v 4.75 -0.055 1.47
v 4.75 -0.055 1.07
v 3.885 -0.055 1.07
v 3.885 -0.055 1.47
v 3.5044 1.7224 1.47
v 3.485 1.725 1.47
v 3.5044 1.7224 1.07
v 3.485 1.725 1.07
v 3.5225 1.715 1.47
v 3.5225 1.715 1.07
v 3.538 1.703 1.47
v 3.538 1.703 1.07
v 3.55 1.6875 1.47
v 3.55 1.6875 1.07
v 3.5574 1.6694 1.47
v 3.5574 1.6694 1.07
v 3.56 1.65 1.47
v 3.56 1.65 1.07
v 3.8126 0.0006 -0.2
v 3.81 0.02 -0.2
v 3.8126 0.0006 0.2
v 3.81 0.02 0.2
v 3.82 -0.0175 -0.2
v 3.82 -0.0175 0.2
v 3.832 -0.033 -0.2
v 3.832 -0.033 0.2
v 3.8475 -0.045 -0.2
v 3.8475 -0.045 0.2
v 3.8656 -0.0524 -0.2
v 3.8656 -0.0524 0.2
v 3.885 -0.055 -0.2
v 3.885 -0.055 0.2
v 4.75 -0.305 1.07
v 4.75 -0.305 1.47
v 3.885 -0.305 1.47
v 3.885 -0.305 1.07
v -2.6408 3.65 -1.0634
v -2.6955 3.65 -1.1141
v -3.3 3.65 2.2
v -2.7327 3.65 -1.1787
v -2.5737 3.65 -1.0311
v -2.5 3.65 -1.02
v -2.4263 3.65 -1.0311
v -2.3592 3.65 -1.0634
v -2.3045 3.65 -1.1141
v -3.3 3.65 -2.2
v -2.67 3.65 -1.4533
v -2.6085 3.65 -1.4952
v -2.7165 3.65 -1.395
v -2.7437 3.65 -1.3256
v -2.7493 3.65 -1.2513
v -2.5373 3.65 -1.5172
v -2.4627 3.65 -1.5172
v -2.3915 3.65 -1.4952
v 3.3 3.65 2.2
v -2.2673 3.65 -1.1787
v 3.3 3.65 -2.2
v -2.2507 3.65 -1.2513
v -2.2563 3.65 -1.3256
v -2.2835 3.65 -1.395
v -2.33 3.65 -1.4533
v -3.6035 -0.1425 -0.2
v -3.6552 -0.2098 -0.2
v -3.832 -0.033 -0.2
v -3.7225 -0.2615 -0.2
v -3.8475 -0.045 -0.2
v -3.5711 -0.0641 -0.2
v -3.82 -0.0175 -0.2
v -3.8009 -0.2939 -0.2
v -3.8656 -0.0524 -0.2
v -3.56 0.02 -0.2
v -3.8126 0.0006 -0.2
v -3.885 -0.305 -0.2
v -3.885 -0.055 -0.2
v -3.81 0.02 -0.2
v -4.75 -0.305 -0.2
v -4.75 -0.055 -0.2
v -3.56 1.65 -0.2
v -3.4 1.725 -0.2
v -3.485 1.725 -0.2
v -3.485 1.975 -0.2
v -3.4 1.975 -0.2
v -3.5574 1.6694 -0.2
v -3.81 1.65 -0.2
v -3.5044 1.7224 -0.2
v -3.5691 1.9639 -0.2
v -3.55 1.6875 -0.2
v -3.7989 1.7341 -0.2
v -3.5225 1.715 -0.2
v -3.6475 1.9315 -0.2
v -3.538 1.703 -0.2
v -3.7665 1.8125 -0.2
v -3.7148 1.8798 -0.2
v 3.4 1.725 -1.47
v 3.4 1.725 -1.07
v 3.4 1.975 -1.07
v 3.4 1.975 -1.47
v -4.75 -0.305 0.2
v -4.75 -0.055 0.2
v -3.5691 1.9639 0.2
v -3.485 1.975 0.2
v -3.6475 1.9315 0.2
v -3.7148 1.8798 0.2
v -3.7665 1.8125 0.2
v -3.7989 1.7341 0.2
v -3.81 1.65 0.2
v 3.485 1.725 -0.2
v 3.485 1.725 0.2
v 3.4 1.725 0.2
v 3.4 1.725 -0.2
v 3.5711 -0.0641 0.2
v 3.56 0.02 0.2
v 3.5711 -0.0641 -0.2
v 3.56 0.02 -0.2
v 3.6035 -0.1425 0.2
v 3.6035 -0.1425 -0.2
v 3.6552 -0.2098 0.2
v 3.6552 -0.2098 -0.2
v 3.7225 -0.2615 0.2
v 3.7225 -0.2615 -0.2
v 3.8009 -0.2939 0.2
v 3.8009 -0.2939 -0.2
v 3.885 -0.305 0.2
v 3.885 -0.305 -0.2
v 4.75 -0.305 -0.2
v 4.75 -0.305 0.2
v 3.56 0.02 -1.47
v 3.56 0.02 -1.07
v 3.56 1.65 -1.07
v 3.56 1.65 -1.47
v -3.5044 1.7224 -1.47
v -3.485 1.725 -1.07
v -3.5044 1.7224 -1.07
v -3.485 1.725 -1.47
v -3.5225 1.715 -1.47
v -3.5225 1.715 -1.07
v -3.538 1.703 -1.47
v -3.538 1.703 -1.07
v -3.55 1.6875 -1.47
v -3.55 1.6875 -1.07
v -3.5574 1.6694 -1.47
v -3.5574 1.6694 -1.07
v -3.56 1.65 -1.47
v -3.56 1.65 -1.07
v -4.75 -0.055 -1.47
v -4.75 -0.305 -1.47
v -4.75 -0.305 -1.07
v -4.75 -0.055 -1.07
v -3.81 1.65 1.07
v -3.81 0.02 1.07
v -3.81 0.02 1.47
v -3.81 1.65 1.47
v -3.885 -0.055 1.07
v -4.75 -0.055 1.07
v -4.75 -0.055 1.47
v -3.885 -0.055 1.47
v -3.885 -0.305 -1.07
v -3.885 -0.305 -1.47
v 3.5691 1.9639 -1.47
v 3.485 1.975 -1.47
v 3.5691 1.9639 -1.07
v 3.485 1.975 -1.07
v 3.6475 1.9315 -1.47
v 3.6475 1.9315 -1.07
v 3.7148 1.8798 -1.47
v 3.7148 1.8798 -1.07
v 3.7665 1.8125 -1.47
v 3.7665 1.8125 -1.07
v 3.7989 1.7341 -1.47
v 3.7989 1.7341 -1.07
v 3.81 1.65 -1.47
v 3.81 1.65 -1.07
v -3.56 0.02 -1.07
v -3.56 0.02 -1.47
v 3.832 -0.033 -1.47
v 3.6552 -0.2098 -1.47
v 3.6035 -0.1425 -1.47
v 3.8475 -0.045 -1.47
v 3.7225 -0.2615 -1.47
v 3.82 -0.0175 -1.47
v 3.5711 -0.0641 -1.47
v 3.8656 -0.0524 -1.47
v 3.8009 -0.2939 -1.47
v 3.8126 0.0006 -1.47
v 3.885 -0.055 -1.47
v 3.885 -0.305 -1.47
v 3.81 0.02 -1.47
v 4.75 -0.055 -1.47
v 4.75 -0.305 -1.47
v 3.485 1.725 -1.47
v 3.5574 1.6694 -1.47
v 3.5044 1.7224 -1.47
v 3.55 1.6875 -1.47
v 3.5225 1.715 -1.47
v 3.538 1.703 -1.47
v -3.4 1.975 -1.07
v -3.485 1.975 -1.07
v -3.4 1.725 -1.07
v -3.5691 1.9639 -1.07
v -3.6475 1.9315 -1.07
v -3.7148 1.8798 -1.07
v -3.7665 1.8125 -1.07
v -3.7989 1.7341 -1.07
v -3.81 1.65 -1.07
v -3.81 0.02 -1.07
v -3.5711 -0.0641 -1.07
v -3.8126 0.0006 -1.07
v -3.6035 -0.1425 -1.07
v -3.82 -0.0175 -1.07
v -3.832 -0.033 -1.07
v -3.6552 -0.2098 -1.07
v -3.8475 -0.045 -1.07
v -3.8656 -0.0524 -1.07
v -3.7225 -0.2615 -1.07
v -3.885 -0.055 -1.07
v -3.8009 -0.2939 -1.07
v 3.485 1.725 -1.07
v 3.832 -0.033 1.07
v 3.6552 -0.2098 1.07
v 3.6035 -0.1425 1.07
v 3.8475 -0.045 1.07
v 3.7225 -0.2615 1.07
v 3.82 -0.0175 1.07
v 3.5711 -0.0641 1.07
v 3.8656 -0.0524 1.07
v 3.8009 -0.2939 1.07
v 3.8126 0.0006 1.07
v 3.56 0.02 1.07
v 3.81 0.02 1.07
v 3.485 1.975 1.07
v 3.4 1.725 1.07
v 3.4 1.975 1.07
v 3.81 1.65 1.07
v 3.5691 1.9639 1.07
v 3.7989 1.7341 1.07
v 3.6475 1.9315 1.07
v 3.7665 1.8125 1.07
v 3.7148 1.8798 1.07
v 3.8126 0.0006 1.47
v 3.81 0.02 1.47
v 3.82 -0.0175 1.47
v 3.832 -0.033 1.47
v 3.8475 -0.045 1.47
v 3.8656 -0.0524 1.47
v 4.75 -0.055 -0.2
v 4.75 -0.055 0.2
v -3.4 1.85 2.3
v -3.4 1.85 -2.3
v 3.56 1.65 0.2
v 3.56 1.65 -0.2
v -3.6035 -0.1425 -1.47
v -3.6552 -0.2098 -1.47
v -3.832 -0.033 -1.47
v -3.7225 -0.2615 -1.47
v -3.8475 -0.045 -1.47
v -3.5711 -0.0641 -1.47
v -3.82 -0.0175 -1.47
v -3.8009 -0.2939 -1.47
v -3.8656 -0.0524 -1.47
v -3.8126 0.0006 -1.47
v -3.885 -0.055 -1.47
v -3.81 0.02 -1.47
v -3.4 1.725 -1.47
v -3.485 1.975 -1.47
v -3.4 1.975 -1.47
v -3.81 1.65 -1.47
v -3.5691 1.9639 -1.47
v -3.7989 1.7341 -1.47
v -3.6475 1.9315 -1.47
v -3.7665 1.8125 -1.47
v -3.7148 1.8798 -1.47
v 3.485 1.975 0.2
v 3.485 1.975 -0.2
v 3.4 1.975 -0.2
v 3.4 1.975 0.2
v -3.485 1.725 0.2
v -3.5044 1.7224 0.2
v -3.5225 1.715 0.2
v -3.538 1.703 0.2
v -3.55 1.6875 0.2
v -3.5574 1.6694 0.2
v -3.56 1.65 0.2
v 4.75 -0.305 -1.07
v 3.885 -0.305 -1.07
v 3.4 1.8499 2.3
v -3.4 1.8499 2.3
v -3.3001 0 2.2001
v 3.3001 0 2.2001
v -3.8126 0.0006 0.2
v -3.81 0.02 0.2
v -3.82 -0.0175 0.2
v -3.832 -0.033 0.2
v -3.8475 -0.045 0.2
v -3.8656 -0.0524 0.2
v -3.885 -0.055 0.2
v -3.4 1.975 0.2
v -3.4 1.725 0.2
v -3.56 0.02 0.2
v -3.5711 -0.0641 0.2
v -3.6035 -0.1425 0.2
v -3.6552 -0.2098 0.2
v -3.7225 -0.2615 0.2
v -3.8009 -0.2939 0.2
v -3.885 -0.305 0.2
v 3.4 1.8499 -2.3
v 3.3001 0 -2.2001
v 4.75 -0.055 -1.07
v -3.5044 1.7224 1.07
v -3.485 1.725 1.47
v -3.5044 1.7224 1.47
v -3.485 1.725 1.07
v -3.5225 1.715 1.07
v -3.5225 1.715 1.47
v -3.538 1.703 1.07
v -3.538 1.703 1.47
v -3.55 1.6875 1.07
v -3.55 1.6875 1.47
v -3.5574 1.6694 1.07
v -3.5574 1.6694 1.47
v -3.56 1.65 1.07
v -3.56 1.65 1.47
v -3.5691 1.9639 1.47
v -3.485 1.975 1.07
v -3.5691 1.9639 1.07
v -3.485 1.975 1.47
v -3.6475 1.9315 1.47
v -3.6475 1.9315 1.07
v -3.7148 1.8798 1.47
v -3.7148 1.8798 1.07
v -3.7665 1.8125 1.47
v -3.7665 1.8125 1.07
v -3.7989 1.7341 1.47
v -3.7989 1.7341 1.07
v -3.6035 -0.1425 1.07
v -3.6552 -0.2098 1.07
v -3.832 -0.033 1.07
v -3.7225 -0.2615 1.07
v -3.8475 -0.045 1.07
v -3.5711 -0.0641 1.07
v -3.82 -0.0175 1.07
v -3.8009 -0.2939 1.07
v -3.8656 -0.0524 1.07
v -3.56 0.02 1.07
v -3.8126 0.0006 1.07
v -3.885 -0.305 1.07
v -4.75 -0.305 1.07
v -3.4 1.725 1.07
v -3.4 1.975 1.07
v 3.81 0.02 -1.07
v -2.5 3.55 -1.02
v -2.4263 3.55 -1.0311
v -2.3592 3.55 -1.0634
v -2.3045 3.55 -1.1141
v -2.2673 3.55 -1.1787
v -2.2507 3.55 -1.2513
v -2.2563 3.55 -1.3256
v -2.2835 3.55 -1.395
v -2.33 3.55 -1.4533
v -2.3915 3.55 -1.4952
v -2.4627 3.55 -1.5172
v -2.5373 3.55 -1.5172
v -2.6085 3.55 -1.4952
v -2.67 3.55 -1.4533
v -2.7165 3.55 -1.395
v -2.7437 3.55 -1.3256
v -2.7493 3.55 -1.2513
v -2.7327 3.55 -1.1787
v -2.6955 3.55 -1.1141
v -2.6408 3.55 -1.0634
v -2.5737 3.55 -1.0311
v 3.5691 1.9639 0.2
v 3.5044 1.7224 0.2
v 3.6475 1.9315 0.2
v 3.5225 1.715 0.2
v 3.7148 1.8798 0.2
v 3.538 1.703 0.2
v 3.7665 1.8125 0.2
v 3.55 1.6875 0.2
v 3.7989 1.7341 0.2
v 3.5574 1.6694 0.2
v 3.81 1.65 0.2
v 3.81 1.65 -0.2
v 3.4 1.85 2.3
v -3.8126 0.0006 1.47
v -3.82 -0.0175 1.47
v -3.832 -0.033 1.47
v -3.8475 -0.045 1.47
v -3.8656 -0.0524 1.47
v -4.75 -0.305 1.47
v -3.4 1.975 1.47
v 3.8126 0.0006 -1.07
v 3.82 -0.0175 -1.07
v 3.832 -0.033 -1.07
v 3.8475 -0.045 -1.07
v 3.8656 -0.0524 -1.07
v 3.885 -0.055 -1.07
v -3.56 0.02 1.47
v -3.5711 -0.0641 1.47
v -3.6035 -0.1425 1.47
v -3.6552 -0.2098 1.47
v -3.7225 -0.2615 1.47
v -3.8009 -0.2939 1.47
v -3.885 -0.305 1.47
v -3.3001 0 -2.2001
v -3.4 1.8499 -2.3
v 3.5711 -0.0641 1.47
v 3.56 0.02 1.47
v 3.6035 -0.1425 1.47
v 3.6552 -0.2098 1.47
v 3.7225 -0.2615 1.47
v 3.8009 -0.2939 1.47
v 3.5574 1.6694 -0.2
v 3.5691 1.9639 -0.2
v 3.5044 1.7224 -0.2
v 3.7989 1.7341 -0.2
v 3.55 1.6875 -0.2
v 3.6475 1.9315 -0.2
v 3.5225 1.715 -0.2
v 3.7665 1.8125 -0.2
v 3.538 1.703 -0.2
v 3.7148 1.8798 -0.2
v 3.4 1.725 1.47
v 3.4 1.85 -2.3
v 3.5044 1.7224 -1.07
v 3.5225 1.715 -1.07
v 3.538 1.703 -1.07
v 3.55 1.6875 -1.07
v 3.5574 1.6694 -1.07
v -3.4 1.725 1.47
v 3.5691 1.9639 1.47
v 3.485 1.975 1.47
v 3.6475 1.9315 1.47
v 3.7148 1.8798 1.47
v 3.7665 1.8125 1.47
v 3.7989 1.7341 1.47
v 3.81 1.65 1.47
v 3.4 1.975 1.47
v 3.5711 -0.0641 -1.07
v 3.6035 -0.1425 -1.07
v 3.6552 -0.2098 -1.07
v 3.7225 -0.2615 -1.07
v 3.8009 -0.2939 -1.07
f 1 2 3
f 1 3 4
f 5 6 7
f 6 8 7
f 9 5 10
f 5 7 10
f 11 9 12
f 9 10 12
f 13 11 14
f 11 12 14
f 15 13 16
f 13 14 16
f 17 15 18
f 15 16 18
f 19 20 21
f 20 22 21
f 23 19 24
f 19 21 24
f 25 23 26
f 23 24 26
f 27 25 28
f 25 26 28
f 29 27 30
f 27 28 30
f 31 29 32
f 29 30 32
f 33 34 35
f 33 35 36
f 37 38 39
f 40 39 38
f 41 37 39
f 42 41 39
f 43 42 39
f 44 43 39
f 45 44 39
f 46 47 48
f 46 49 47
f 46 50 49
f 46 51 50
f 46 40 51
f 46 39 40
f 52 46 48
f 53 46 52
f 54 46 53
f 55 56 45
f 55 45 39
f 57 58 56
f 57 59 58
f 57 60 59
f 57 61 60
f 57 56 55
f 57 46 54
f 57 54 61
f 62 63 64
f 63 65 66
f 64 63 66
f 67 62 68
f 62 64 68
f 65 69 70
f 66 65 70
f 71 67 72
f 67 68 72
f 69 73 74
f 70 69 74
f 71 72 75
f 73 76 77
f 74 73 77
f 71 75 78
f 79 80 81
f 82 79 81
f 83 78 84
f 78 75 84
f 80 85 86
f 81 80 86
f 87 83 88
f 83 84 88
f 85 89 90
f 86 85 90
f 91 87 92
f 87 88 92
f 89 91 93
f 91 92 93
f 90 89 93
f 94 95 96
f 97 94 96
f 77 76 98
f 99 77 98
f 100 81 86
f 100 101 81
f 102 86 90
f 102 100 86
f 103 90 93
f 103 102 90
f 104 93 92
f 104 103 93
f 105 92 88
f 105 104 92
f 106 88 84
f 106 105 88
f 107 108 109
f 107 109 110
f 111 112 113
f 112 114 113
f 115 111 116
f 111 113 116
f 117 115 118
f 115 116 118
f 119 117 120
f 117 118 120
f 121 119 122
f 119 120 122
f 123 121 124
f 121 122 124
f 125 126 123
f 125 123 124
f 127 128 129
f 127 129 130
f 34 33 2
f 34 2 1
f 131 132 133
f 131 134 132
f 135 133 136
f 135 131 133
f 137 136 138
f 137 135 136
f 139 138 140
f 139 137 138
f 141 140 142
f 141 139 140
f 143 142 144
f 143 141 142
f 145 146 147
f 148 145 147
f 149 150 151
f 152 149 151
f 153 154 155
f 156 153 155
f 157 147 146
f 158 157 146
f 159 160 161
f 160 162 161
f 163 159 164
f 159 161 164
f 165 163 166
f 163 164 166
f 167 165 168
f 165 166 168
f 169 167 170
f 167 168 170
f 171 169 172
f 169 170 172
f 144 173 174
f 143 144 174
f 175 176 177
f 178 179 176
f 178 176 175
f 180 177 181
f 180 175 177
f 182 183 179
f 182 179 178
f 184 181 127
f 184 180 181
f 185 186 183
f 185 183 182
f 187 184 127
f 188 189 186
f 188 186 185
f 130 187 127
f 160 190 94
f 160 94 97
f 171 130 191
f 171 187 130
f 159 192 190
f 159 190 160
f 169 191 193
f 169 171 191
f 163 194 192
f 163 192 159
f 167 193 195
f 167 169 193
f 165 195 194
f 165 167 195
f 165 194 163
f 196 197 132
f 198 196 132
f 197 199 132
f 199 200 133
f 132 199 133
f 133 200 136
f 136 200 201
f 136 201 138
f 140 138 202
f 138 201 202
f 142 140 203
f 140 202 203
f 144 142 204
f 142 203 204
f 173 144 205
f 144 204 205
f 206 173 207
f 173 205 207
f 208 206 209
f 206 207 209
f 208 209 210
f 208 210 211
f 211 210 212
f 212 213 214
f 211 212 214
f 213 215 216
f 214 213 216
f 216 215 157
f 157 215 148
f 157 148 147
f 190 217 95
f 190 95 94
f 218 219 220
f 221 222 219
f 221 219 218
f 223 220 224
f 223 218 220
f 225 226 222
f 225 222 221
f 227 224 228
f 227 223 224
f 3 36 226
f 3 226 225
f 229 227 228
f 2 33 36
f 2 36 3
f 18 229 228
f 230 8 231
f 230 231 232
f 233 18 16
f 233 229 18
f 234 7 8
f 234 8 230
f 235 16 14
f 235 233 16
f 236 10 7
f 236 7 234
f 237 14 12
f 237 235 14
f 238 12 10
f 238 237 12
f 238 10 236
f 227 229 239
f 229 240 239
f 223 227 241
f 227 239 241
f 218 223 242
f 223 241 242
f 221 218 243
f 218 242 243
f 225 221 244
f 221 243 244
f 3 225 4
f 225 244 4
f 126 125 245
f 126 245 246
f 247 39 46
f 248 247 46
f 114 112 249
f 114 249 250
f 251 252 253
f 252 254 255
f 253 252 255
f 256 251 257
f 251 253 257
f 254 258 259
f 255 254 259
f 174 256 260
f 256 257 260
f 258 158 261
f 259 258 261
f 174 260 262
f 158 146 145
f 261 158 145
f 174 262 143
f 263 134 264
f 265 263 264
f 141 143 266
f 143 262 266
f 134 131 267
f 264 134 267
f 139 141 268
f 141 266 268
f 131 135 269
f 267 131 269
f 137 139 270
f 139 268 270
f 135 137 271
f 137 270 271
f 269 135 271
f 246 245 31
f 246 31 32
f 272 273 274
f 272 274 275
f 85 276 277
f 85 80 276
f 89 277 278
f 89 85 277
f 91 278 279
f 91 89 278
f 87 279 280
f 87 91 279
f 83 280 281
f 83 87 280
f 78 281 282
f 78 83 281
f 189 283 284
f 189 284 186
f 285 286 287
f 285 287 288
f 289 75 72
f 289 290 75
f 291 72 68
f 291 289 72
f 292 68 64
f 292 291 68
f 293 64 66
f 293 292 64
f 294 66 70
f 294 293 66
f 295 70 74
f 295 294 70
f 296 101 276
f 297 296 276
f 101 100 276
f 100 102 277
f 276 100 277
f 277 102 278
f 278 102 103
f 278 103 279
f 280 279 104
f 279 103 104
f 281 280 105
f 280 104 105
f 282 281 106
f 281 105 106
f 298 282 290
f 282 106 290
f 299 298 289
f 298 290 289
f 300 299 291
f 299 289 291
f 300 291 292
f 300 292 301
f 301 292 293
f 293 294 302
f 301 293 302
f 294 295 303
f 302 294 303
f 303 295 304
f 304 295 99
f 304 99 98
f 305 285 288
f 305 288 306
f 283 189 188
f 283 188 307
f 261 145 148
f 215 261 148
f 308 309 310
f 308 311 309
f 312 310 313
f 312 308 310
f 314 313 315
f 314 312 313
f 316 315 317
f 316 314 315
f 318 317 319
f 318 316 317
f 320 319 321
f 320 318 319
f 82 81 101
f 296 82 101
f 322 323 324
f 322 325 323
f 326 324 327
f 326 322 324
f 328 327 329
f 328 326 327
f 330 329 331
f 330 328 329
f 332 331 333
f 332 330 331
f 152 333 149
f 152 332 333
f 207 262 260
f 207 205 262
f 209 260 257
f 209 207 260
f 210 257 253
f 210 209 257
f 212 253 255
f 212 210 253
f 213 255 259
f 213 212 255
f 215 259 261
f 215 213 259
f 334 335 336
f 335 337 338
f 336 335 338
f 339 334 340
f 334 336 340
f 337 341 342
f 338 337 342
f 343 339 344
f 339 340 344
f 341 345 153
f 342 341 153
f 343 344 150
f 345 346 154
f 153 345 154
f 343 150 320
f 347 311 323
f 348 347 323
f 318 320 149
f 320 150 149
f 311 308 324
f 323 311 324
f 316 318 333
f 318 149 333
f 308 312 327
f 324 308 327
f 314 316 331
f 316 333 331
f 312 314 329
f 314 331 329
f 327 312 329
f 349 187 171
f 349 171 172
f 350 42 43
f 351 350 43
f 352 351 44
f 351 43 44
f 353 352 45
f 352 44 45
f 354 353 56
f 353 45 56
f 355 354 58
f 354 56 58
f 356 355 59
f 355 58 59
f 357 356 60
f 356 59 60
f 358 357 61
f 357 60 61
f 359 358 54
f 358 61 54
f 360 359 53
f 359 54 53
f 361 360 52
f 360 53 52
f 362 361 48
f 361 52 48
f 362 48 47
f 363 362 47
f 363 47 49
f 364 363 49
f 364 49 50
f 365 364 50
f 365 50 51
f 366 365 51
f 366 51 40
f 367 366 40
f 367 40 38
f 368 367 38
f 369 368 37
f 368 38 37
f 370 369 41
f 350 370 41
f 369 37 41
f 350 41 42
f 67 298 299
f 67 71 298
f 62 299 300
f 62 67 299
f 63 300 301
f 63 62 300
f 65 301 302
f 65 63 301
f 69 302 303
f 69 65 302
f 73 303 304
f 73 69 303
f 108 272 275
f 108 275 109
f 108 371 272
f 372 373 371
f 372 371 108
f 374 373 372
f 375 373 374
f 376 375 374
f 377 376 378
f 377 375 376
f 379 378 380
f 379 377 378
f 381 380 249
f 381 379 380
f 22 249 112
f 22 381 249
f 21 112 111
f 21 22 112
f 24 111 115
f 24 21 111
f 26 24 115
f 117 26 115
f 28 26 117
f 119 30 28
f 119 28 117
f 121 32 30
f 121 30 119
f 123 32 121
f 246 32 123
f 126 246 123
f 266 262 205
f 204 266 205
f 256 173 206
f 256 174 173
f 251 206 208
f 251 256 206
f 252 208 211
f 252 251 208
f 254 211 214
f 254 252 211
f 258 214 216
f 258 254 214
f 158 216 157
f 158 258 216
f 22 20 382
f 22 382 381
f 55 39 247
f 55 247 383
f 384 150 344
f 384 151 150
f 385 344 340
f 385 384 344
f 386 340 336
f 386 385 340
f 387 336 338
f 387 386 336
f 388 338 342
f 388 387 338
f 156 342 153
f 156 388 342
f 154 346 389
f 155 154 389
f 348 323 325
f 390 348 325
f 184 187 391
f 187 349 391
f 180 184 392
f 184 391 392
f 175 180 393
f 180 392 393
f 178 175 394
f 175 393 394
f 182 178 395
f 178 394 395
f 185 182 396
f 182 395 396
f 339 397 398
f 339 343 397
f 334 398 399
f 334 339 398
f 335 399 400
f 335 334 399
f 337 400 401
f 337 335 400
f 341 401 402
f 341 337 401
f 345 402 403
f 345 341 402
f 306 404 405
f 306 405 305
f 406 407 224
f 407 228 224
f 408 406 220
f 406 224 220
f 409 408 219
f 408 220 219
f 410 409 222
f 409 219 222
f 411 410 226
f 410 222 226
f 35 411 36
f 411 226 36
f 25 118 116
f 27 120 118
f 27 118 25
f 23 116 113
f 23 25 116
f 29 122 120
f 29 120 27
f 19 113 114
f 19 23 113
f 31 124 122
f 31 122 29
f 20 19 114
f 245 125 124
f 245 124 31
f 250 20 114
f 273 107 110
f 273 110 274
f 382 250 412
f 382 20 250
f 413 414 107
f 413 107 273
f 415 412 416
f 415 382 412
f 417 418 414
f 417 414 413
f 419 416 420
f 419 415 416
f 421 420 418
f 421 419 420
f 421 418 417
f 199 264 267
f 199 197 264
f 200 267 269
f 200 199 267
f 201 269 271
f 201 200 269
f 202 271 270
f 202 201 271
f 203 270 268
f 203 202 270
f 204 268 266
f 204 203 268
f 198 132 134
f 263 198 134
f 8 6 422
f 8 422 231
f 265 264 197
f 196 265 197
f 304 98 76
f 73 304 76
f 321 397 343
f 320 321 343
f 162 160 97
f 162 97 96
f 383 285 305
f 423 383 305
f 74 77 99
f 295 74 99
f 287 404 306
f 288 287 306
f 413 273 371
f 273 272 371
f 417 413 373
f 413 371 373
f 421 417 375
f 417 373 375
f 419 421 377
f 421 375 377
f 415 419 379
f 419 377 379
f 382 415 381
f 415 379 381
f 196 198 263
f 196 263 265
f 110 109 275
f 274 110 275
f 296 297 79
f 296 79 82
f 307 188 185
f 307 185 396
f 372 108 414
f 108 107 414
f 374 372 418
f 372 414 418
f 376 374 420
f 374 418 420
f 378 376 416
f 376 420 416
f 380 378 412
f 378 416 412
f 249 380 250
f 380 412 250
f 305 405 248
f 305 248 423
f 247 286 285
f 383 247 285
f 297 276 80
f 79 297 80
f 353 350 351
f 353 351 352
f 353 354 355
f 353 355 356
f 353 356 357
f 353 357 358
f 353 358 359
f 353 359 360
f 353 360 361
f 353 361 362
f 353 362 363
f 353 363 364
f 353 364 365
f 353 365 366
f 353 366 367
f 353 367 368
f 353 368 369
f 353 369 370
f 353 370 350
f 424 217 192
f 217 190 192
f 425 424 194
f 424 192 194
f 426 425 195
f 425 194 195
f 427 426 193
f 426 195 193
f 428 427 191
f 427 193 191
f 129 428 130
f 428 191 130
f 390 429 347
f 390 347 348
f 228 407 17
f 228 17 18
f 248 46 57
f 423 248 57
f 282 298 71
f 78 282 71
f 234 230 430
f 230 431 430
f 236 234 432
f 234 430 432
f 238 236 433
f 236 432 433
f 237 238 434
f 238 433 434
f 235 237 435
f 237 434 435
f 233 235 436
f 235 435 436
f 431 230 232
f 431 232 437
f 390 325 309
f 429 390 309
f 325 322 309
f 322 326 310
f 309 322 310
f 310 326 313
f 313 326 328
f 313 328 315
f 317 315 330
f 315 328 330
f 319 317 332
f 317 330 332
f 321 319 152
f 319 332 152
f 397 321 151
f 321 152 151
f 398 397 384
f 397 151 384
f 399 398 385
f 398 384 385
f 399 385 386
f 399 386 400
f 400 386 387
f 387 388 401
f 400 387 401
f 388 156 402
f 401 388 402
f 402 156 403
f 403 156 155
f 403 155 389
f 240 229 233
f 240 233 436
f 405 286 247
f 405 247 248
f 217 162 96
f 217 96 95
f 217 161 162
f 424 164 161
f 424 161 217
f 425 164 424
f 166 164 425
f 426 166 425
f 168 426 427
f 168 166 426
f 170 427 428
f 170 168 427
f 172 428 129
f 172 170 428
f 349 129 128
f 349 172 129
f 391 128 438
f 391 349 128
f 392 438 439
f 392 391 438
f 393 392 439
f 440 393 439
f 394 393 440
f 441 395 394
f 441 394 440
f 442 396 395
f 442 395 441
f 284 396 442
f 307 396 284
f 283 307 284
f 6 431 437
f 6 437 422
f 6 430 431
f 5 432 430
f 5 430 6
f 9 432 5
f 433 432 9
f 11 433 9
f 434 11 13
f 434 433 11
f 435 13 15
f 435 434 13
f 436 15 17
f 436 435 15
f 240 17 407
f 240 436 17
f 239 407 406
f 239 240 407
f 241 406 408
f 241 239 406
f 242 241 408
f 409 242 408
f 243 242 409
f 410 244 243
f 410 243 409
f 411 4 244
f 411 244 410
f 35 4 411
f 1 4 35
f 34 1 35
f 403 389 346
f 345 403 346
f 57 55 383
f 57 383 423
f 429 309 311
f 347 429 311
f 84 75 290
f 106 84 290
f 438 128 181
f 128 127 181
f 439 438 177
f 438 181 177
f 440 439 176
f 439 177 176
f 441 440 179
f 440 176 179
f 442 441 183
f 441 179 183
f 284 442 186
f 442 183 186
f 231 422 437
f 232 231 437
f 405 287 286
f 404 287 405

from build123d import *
from OCP.BRepFilletAPI import BRepFilletAPI_MakeChamfer

# Parameters (mm, degrees)
SKETCH_1_W                = 6.8
SKETCH_1_H                = 4.6
EXTRUDE_292_DEPTH         = 3.65
CHAMFER_365_SIZE          = 1.8
CHAMFER_365_SIZE2         = 0.1
CHAMFER_503_SIZE          = 1.85
CHAMFER_503_SIZE_2        = 0.1
ESBO_O6_W                 = 0.4
ESBO_O6_H                 = 0.25
PATTERN_LINEAR_1113_COUNT = 3
PATTERN_LINEAR_1113_PITCH = 1.27
SKETCH_11_R               = 0.25
CUT_EXTRUDE_1_DEPTH       = 0.1


with BuildPart() as part:
    # Эскиз1 → Extrude 292 (new body)
    with BuildSketch(Plane(origin=(0, 0, 0), x_dir=(1, 0, 0), z_dir=(0, 1, 0))):
        Rectangle(SKETCH_1_W, SKETCH_1_H)
    extrude(amount=EXTRUDE_292_DEPTH)

    # Chamfer 365: one chamfer whose edges measure the first distance from different faces: ONE call of the kernel's chamfer builder (chamfer() names one face for all edges)
    chamfer_365_edges_1 = [part.edges().sort_by_distance(p)[0] for p in [
        (-3.4, 3.65, 0),
    ]]
    chamfer_365_side_1 = [part.faces().sort_by_distance(p)[0] for p in [
        (-3.4, 1.825, 0),
    ]]
    chamfer_365_edges_2 = [part.edges().sort_by_distance(p)[0] for p in [
        (0, 3.65, 2.3),
    ]]
    chamfer_365_side_2 = [part.faces().sort_by_distance(p)[0] for p in [
        (0, 1.825, 2.3),
    ]]
    chamfer_365_edges_3 = [part.edges().sort_by_distance(p)[0] for p in [
        (3.4, 3.65, 0),
    ]]
    chamfer_365_side_3 = [part.faces().sort_by_distance(p)[0] for p in [
        (3.4, 1.825, 0),
    ]]
    chamfer_365_edges_4 = [part.edges().sort_by_distance(p)[0] for p in [
        (0, 3.65, -2.3),
    ]]
    chamfer_365_side_4 = [part.faces().sort_by_distance(p)[0] for p in [
        (0, 1.825, -2.3),
    ]]
    chamfer_365 = BRepFilletAPI_MakeChamfer(part.part.solid().wrapped)
    for e in chamfer_365_edges_1:
        chamfer_365.Add(CHAMFER_365_SIZE, CHAMFER_365_SIZE2, e.wrapped, chamfer_365_side_1[0].wrapped)  # the first distance lies on this face
    for e in chamfer_365_edges_2:
        chamfer_365.Add(CHAMFER_365_SIZE, CHAMFER_365_SIZE2, e.wrapped, chamfer_365_side_2[0].wrapped)  # the first distance lies on this face
    for e in chamfer_365_edges_3:
        chamfer_365.Add(CHAMFER_365_SIZE, CHAMFER_365_SIZE2, e.wrapped, chamfer_365_side_3[0].wrapped)  # the first distance lies on this face
    for e in chamfer_365_edges_4:
        chamfer_365.Add(CHAMFER_365_SIZE, CHAMFER_365_SIZE2, e.wrapped, chamfer_365_side_4[0].wrapped)  # the first distance lies on this face
    add(Compound.cast(chamfer_365.Shape()), mode=Mode.REPLACE)

    # Chamfer 503
    chamfer_503_edges_1 = [part.edges().sort_by_distance(p)[0] for p in [
        (-3.4, 0, 0),
    ]]
    chamfer_503_side_1 = [part.faces().sort_by_distance(p)[0] for p in [
        (-3.4, 0.002, 0),
    ]]
    chamfer_503_edges_2 = [part.edges().sort_by_distance(p)[0] for p in [
        (0, 0, -2.3),
    ]]
    chamfer_503_side_2 = [part.faces().sort_by_distance(p)[0] for p in [
        (0, 0.002, -2.3),
    ]]
    chamfer_503_edges_3 = [part.edges().sort_by_distance(p)[0] for p in [
        (3.4, 0, 0),
    ]]
    chamfer_503_side_3 = [part.faces().sort_by_distance(p)[0] for p in [
        (3.398, 0, 0),
    ]]
    chamfer_503_edges_4 = [part.edges().sort_by_distance(p)[0] for p in [
        (0, 0, 2.3),
    ]]
    chamfer_503_side_4 = [part.faces().sort_by_distance(p)[0] for p in [
        (0, 0, 2.298),
    ]]
    chamfer_503 = BRepFilletAPI_MakeChamfer(part.part.solid().wrapped)
    for e in chamfer_503_edges_1:
        chamfer_503.Add(CHAMFER_503_SIZE - 0.0001, CHAMFER_503_SIZE_2 - 0.0001, e.wrapped, chamfer_503_side_1[0].wrapped)
    for e in chamfer_503_edges_2:
        chamfer_503.Add(CHAMFER_503_SIZE - 0.0001, CHAMFER_503_SIZE_2 - 0.0001, e.wrapped, chamfer_503_side_2[0].wrapped)
    for e in chamfer_503_edges_3:
        chamfer_503.Add(CHAMFER_503_SIZE_2 - 0.0001, CHAMFER_503_SIZE - 0.0001, e.wrapped, chamfer_503_side_3[0].wrapped)
    for e in chamfer_503_edges_4:
        chamfer_503.Add(CHAMFER_503_SIZE_2 - 0.0001, CHAMFER_503_SIZE - 0.0001, e.wrapped, chamfer_503_side_4[0].wrapped)
    add(Compound.cast(chamfer_503.Shape()), mode=Mode.REPLACE)  # a hair under: the kernel refuses the full size

    # Эскиз11 → Вырез метка 1 ножки (cut)
    with BuildSketch(Plane(origin=(0, 3.65, 0), x_dir=(1, 0, 0), z_dir=(0, 1, 0))):
        with Locations(Location((-2.5, 1.27, 0), (0, 0, 270))):
            Circle(SKETCH_11_R)
    extrude(amount=-CUT_EXTRUDE_1_DEPTH, mode=Mode.SUBTRACT)


with BuildPart() as body_2:
    # Sweep 758: sweep along a path in Esboço2
    with BuildLine(Plane.XY) as sweep_758_path:
        Line((-3.4, 1.85), (-3.485, 1.85))
        ThreePointArc((-3.485, 1.85), (-3.626421356, 1.791421356), (-3.685, 1.65))
        Line((-3.685, 1.65), (-3.685, 0.02))
        ThreePointArc((-3.685, 0.02), (-3.743578644, -0.121421356), (-3.885, -0.18))
        Line((-3.885, -0.18), (-4.75, -0.18))
    # Esboço6 → Sweep 758 (sweep)
    with BuildSketch(Plane(origin=(-4.75, 0, 0), x_dir=(0, 0, -1), z_dir=(1, 0, 0))):
        with Locations((0, -0.18)):
            Rectangle(ESBO_O6_W, ESBO_O6_H)
    sweep(path=sweep_758_path.line)


with BuildPart() as body_2_1:
    # Move Face 801: read off the stored shape, not the designer's step
    # Move Face 801: moved
    add(body_2.part.moved(Location((0, 0, 1.27))))


with BuildPart() as pattern_linear_1113_1:
    # Pattern Linear 1113: pattern copy
    add(body_2_1.part.moved(Location(Vector(0, 0, -1) * (1 * PATTERN_LINEAR_1113_PITCH))))


with BuildPart() as pattern_linear_1113_2:
    # Pattern Linear 1113: pattern copy
    add(body_2_1.part.moved(Location(Vector(0, 0, -1) * (2 * PATTERN_LINEAR_1113_PITCH))))


with BuildPart() as body_5:
    # Mirror 1204: mirrored copy
    add(body_2_1.part.mirror(Plane(origin=(0, 0, 0), x_dir=(0, 0, 1), z_dir=(1, 0, 0))))


with BuildPart() as body_6:
    # Mirror 1204 2: mirrored copy
    add(pattern_linear_1113_1.part.mirror(Plane(origin=(0, 0, 0), x_dir=(0, 0, 1), z_dir=(1, 0, 0))))


with BuildPart() as body_7:
    # Mirror 1204 3: mirrored copy
    add(pattern_linear_1113_2.part.mirror(Plane(origin=(0, 0, 0), x_dir=(0, 0, 1), z_dir=(1, 0, 0))))


solid = Compound([part.part, body_2_1.part, pattern_linear_1113_1.part, pattern_linear_1113_2.part, body_5.part, body_6.part, body_7.part])
